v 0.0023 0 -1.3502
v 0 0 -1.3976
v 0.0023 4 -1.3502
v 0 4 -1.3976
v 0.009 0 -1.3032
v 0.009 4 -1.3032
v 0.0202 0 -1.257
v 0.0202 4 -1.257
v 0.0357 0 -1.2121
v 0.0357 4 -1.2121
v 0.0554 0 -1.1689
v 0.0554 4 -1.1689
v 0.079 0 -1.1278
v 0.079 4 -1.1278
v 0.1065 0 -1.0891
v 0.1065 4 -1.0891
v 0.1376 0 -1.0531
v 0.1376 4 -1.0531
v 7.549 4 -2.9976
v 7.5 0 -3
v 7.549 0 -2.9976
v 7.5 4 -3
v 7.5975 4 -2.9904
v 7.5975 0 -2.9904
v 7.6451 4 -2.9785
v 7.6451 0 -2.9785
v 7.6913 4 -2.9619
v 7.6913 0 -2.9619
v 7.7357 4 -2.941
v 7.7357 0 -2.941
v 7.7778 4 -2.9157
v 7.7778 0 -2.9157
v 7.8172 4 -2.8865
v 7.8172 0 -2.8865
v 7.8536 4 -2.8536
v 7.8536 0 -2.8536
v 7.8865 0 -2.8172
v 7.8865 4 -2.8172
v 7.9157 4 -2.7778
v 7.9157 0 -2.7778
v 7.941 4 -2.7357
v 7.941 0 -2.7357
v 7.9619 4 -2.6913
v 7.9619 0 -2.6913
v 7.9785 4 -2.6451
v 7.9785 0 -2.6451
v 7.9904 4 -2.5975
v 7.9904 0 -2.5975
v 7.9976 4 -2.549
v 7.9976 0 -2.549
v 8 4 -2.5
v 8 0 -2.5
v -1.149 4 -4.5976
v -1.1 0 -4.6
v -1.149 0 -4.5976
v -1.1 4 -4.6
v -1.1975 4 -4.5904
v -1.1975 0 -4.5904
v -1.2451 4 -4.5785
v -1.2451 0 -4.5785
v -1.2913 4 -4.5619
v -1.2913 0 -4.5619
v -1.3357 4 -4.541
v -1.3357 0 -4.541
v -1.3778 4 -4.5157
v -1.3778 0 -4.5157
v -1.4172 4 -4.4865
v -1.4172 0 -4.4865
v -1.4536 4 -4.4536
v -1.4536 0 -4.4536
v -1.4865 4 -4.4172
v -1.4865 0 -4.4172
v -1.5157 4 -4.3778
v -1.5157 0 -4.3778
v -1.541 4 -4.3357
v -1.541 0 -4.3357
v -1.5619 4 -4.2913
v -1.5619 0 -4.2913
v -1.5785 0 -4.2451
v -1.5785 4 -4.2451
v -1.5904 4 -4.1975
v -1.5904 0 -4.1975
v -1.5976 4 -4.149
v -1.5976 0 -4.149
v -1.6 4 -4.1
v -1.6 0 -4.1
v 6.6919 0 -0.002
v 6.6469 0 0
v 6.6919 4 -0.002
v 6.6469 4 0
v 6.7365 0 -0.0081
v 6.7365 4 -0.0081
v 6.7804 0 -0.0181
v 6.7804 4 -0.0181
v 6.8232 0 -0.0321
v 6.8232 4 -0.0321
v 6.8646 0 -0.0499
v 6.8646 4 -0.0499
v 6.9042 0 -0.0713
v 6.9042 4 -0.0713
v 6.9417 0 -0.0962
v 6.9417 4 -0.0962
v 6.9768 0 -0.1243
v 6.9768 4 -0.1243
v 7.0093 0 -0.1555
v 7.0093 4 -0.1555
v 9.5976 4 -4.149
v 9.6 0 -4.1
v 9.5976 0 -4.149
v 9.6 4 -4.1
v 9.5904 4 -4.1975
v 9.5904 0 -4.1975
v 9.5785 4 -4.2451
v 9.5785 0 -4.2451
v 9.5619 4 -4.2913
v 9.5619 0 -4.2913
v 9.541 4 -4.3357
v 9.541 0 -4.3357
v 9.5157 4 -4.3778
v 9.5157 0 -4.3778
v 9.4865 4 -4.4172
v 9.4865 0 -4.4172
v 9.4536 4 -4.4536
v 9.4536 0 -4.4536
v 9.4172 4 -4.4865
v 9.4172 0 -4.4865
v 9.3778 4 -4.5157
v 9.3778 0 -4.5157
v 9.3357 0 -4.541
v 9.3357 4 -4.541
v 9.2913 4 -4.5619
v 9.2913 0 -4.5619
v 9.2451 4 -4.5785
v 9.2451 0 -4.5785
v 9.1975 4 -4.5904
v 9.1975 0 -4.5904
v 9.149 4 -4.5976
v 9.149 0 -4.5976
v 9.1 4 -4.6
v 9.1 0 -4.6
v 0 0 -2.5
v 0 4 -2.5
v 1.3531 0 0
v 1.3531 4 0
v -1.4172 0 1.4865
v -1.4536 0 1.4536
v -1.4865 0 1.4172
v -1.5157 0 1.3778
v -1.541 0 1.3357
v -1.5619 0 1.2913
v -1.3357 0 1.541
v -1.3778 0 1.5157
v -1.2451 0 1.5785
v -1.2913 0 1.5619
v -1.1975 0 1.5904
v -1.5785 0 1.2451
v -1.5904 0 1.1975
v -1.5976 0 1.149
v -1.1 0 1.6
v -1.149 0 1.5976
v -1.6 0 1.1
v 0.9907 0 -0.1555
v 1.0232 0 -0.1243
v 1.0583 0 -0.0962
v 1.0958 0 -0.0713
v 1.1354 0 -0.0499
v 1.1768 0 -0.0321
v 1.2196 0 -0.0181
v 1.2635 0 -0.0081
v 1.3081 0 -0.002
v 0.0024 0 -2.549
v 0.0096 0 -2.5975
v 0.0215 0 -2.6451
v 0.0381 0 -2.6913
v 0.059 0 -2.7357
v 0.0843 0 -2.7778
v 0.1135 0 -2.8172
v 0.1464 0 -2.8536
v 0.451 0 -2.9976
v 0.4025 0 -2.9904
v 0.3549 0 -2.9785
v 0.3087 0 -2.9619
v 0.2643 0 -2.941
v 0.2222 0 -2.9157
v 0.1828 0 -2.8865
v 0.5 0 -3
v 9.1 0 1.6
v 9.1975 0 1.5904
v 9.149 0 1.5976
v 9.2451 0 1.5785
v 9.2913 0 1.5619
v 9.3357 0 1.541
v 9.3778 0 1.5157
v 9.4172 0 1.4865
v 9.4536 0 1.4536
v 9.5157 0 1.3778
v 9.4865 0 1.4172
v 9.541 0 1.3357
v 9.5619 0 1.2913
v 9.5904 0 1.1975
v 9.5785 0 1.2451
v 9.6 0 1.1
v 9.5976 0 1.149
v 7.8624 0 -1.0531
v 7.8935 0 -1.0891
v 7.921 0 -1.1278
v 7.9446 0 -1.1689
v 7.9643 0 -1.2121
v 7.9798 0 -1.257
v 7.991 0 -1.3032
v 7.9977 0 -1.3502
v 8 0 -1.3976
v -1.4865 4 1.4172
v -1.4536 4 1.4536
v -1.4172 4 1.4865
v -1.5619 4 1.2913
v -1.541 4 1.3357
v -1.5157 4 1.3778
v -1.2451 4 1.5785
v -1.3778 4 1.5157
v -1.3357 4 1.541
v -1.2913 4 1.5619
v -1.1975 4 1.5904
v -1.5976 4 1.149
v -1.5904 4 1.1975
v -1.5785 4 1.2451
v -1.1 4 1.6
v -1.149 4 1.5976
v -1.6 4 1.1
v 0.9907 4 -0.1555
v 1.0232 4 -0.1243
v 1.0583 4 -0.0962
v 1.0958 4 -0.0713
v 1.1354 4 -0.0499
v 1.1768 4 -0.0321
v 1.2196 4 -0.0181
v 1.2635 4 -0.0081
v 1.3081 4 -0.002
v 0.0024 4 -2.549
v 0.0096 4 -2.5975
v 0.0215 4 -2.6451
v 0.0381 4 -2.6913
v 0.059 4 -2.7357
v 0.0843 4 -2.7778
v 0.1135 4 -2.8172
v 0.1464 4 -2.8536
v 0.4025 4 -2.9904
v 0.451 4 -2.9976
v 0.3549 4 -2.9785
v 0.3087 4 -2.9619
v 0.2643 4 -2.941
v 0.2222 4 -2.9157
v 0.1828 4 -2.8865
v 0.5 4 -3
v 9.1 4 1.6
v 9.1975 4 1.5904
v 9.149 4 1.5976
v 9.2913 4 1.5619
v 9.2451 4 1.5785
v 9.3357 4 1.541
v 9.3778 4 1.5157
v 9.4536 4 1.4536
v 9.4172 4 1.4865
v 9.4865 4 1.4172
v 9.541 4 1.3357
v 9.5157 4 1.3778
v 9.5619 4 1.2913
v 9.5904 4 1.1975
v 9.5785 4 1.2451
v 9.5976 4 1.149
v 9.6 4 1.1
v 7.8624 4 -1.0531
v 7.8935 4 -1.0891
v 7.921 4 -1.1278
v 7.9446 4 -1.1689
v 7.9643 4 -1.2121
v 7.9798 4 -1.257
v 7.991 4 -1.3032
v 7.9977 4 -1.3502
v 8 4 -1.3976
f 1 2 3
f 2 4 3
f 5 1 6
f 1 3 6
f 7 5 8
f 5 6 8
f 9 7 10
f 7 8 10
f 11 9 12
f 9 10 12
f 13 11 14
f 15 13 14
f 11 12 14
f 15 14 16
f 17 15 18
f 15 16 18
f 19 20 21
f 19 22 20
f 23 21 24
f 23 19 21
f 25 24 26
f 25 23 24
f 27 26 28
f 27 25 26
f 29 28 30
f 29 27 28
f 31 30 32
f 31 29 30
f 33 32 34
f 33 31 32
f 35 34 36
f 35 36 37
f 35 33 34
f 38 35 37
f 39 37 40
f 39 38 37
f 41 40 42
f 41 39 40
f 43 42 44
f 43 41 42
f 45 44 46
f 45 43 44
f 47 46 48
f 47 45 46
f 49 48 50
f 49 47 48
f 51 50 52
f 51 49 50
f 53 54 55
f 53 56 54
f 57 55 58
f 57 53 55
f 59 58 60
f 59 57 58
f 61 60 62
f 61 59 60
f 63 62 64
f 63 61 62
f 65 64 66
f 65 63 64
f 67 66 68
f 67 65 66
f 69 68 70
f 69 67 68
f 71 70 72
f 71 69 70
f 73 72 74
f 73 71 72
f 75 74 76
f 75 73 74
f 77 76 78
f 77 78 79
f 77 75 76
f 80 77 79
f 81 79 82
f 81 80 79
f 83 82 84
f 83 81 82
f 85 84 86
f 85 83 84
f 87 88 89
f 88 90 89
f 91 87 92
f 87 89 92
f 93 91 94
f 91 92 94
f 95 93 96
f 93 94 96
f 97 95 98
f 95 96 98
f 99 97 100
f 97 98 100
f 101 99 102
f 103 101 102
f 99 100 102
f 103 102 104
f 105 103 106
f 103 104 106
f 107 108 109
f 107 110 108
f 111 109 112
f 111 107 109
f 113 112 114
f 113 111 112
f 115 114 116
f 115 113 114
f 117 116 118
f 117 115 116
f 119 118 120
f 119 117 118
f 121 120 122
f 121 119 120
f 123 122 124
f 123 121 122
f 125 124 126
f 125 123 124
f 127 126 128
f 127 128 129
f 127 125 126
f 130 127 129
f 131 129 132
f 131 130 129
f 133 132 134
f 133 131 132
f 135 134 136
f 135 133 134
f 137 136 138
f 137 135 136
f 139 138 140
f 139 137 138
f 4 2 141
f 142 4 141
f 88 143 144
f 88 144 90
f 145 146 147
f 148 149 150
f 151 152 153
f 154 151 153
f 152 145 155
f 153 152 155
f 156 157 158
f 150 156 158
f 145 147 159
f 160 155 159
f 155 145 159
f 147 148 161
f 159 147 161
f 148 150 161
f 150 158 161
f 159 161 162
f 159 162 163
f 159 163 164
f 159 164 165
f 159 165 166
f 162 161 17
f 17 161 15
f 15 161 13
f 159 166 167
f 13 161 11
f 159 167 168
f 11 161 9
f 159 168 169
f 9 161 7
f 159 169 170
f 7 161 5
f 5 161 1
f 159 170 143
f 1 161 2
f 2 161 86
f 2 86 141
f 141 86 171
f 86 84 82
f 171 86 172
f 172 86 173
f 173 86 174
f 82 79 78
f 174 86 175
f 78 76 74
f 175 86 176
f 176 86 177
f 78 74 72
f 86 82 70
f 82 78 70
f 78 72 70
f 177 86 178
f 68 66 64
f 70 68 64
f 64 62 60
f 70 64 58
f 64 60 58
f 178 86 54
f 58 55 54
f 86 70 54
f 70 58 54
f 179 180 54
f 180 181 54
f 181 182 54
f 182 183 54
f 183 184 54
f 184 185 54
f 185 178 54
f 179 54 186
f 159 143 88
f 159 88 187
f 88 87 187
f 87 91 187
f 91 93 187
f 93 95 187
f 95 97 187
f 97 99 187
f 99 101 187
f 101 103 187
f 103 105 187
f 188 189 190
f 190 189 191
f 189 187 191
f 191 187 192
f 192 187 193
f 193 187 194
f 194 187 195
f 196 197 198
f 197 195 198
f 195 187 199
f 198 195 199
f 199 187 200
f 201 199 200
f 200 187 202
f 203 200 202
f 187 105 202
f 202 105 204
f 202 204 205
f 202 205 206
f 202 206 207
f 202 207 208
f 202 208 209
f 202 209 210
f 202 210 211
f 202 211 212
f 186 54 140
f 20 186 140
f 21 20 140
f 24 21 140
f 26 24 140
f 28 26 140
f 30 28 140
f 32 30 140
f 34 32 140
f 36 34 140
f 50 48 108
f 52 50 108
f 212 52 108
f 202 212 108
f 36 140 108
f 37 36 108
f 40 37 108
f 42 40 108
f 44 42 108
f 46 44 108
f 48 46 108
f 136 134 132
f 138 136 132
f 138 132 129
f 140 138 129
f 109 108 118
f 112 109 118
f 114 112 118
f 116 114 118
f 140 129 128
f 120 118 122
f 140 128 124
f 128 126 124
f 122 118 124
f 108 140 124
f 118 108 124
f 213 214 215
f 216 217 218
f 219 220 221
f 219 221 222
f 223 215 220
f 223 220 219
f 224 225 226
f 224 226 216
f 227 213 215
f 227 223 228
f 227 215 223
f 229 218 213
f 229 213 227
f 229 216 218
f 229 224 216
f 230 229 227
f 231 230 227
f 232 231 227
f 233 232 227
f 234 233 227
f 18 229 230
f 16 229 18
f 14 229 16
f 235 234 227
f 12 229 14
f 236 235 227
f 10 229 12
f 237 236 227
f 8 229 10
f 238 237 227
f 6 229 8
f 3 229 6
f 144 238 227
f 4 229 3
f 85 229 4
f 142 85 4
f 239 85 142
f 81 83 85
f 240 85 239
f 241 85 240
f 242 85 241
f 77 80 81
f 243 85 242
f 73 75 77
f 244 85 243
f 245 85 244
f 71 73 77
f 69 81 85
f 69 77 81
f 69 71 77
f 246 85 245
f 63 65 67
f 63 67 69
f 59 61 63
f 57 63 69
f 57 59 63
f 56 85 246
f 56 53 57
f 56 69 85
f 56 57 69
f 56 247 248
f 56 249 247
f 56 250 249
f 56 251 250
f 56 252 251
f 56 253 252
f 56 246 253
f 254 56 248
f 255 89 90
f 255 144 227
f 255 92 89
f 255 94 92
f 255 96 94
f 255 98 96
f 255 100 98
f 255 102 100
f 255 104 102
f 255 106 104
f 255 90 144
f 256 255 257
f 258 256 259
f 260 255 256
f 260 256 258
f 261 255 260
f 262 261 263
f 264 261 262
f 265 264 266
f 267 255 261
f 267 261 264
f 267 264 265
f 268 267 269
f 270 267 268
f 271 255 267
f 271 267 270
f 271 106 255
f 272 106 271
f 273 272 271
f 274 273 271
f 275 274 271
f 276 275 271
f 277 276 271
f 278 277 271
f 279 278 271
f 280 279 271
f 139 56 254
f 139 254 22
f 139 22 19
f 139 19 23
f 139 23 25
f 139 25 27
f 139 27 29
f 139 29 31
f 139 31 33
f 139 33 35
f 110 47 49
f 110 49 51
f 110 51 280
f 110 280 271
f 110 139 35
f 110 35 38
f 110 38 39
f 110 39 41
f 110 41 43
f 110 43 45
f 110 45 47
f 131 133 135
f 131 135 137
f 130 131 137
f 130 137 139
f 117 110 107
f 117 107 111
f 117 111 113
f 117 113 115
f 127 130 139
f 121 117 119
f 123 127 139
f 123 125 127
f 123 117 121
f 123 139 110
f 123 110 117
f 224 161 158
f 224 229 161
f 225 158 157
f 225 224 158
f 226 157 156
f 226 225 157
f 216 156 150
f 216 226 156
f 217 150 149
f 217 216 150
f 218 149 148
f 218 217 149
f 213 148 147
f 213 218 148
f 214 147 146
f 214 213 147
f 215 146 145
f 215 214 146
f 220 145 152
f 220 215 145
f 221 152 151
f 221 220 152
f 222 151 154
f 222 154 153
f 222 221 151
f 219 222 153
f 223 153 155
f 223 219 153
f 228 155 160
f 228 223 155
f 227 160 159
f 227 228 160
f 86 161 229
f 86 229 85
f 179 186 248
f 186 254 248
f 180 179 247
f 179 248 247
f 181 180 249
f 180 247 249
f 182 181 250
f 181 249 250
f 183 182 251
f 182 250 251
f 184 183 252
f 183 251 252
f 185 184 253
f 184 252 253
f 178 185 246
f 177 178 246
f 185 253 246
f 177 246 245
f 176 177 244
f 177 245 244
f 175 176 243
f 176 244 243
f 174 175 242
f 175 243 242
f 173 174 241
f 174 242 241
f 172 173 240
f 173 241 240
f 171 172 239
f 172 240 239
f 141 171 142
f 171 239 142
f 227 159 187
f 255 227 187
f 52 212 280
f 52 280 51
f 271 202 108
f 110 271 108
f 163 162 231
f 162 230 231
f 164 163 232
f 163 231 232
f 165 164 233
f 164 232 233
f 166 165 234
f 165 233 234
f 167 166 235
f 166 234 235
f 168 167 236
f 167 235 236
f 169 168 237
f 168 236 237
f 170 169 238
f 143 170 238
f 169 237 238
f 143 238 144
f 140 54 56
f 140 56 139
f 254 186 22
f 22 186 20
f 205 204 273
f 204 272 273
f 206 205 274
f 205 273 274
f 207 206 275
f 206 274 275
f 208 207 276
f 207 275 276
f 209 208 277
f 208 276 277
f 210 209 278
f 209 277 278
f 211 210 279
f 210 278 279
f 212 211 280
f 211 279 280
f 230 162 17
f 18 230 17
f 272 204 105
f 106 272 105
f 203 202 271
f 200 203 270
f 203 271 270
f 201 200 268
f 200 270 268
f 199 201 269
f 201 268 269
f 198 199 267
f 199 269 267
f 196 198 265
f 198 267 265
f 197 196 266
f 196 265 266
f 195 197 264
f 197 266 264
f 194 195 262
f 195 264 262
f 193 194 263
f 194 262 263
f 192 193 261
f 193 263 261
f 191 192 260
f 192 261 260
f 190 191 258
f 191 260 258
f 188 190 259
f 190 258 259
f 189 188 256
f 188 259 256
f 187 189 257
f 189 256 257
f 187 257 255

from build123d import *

# Parameters (mm, degrees)
SKETCH_1_W      = 11.2
SKETCH_1_H      = 6.2
SKETCH_1_W_2    = 8
SKETCH_1_H_2    = 3
EXTRUDE_1_DEPTH = 4
FILLET_1_R      = 0.5
FILLET_2_R      = 0.5


with BuildPart() as part:
    # Эскиз1 → Бобышка-Вытянуть1 (new body)
    # profile 1 of 4: a face of its own
    with BuildSketch(Plane(origin=(0, 0, 0), x_dir=(1, 0, 0), z_dir=(0, 1, 0))):
        with Locations((4, 1.5)):
            Rectangle(SKETCH_1_W, SKETCH_1_H)
        with Locations((4, 1.5)):
            Rectangle(SKETCH_1_W_2, SKETCH_1_H_2, mode=Mode.SUBTRACT)
    # profile 2 of 4: a face of its own
    with BuildSketch(Plane(origin=(0, 0, 0), x_dir=(1, 0, 0), z_dir=(0, 1, 0))):
        Polygon((4, 4.6), (-1.6, 4.6), (-1.6, -1.6), (4, -1.6), (4, 0), (1.138545398, 0), (0, 0), (0, 1.197894344), (0, 3), (4, 3), align=None)
    # profile 3 of 4: a face of its own
    with BuildSketch(Plane(origin=(0, 0, 0), x_dir=(1, 0, 0), z_dir=(0, 1, 0))):
        Polygon((1.138545398, 0), (0, 1.197894344), (0, 0), align=None)
    # profile 4 of 4: a face of its own
    with BuildSketch(Plane(origin=(0, 0, 0), x_dir=(1, 0, 0), z_dir=(0, 1, 0))):
        Polygon((8, 0), (8, 1.197894344), (6.861454602, 0), align=None)
    extrude(amount=EXTRUDE_1_DEPTH)

    # Скругление1
    fillet_1_edges = [part.edges().sort_by_distance(p)[0] for p in [
        (8, 2, -3),
        (0, 2, -3),
    ]]
    fillet(fillet_1_edges, radius=FILLET_1_R)

    # Скругление2
    fillet_2_edges = [part.edges().sort_by_distance(p)[0] for p in [
        (9.6, 2, -4.6),
        (9.6, 2, 1.6),
        (-1.6, 2, 1.6),
        (-1.6, 2, -4.6),
        (6.861454602, 2, 0),
        (8, 2, -1.197894344),
        (0, 2, -1.197894344),
        (1.138545398, 2, 0),
    ]]
    fillet(fillet_2_edges, radius=FILLET_2_R)


solid = part.part
